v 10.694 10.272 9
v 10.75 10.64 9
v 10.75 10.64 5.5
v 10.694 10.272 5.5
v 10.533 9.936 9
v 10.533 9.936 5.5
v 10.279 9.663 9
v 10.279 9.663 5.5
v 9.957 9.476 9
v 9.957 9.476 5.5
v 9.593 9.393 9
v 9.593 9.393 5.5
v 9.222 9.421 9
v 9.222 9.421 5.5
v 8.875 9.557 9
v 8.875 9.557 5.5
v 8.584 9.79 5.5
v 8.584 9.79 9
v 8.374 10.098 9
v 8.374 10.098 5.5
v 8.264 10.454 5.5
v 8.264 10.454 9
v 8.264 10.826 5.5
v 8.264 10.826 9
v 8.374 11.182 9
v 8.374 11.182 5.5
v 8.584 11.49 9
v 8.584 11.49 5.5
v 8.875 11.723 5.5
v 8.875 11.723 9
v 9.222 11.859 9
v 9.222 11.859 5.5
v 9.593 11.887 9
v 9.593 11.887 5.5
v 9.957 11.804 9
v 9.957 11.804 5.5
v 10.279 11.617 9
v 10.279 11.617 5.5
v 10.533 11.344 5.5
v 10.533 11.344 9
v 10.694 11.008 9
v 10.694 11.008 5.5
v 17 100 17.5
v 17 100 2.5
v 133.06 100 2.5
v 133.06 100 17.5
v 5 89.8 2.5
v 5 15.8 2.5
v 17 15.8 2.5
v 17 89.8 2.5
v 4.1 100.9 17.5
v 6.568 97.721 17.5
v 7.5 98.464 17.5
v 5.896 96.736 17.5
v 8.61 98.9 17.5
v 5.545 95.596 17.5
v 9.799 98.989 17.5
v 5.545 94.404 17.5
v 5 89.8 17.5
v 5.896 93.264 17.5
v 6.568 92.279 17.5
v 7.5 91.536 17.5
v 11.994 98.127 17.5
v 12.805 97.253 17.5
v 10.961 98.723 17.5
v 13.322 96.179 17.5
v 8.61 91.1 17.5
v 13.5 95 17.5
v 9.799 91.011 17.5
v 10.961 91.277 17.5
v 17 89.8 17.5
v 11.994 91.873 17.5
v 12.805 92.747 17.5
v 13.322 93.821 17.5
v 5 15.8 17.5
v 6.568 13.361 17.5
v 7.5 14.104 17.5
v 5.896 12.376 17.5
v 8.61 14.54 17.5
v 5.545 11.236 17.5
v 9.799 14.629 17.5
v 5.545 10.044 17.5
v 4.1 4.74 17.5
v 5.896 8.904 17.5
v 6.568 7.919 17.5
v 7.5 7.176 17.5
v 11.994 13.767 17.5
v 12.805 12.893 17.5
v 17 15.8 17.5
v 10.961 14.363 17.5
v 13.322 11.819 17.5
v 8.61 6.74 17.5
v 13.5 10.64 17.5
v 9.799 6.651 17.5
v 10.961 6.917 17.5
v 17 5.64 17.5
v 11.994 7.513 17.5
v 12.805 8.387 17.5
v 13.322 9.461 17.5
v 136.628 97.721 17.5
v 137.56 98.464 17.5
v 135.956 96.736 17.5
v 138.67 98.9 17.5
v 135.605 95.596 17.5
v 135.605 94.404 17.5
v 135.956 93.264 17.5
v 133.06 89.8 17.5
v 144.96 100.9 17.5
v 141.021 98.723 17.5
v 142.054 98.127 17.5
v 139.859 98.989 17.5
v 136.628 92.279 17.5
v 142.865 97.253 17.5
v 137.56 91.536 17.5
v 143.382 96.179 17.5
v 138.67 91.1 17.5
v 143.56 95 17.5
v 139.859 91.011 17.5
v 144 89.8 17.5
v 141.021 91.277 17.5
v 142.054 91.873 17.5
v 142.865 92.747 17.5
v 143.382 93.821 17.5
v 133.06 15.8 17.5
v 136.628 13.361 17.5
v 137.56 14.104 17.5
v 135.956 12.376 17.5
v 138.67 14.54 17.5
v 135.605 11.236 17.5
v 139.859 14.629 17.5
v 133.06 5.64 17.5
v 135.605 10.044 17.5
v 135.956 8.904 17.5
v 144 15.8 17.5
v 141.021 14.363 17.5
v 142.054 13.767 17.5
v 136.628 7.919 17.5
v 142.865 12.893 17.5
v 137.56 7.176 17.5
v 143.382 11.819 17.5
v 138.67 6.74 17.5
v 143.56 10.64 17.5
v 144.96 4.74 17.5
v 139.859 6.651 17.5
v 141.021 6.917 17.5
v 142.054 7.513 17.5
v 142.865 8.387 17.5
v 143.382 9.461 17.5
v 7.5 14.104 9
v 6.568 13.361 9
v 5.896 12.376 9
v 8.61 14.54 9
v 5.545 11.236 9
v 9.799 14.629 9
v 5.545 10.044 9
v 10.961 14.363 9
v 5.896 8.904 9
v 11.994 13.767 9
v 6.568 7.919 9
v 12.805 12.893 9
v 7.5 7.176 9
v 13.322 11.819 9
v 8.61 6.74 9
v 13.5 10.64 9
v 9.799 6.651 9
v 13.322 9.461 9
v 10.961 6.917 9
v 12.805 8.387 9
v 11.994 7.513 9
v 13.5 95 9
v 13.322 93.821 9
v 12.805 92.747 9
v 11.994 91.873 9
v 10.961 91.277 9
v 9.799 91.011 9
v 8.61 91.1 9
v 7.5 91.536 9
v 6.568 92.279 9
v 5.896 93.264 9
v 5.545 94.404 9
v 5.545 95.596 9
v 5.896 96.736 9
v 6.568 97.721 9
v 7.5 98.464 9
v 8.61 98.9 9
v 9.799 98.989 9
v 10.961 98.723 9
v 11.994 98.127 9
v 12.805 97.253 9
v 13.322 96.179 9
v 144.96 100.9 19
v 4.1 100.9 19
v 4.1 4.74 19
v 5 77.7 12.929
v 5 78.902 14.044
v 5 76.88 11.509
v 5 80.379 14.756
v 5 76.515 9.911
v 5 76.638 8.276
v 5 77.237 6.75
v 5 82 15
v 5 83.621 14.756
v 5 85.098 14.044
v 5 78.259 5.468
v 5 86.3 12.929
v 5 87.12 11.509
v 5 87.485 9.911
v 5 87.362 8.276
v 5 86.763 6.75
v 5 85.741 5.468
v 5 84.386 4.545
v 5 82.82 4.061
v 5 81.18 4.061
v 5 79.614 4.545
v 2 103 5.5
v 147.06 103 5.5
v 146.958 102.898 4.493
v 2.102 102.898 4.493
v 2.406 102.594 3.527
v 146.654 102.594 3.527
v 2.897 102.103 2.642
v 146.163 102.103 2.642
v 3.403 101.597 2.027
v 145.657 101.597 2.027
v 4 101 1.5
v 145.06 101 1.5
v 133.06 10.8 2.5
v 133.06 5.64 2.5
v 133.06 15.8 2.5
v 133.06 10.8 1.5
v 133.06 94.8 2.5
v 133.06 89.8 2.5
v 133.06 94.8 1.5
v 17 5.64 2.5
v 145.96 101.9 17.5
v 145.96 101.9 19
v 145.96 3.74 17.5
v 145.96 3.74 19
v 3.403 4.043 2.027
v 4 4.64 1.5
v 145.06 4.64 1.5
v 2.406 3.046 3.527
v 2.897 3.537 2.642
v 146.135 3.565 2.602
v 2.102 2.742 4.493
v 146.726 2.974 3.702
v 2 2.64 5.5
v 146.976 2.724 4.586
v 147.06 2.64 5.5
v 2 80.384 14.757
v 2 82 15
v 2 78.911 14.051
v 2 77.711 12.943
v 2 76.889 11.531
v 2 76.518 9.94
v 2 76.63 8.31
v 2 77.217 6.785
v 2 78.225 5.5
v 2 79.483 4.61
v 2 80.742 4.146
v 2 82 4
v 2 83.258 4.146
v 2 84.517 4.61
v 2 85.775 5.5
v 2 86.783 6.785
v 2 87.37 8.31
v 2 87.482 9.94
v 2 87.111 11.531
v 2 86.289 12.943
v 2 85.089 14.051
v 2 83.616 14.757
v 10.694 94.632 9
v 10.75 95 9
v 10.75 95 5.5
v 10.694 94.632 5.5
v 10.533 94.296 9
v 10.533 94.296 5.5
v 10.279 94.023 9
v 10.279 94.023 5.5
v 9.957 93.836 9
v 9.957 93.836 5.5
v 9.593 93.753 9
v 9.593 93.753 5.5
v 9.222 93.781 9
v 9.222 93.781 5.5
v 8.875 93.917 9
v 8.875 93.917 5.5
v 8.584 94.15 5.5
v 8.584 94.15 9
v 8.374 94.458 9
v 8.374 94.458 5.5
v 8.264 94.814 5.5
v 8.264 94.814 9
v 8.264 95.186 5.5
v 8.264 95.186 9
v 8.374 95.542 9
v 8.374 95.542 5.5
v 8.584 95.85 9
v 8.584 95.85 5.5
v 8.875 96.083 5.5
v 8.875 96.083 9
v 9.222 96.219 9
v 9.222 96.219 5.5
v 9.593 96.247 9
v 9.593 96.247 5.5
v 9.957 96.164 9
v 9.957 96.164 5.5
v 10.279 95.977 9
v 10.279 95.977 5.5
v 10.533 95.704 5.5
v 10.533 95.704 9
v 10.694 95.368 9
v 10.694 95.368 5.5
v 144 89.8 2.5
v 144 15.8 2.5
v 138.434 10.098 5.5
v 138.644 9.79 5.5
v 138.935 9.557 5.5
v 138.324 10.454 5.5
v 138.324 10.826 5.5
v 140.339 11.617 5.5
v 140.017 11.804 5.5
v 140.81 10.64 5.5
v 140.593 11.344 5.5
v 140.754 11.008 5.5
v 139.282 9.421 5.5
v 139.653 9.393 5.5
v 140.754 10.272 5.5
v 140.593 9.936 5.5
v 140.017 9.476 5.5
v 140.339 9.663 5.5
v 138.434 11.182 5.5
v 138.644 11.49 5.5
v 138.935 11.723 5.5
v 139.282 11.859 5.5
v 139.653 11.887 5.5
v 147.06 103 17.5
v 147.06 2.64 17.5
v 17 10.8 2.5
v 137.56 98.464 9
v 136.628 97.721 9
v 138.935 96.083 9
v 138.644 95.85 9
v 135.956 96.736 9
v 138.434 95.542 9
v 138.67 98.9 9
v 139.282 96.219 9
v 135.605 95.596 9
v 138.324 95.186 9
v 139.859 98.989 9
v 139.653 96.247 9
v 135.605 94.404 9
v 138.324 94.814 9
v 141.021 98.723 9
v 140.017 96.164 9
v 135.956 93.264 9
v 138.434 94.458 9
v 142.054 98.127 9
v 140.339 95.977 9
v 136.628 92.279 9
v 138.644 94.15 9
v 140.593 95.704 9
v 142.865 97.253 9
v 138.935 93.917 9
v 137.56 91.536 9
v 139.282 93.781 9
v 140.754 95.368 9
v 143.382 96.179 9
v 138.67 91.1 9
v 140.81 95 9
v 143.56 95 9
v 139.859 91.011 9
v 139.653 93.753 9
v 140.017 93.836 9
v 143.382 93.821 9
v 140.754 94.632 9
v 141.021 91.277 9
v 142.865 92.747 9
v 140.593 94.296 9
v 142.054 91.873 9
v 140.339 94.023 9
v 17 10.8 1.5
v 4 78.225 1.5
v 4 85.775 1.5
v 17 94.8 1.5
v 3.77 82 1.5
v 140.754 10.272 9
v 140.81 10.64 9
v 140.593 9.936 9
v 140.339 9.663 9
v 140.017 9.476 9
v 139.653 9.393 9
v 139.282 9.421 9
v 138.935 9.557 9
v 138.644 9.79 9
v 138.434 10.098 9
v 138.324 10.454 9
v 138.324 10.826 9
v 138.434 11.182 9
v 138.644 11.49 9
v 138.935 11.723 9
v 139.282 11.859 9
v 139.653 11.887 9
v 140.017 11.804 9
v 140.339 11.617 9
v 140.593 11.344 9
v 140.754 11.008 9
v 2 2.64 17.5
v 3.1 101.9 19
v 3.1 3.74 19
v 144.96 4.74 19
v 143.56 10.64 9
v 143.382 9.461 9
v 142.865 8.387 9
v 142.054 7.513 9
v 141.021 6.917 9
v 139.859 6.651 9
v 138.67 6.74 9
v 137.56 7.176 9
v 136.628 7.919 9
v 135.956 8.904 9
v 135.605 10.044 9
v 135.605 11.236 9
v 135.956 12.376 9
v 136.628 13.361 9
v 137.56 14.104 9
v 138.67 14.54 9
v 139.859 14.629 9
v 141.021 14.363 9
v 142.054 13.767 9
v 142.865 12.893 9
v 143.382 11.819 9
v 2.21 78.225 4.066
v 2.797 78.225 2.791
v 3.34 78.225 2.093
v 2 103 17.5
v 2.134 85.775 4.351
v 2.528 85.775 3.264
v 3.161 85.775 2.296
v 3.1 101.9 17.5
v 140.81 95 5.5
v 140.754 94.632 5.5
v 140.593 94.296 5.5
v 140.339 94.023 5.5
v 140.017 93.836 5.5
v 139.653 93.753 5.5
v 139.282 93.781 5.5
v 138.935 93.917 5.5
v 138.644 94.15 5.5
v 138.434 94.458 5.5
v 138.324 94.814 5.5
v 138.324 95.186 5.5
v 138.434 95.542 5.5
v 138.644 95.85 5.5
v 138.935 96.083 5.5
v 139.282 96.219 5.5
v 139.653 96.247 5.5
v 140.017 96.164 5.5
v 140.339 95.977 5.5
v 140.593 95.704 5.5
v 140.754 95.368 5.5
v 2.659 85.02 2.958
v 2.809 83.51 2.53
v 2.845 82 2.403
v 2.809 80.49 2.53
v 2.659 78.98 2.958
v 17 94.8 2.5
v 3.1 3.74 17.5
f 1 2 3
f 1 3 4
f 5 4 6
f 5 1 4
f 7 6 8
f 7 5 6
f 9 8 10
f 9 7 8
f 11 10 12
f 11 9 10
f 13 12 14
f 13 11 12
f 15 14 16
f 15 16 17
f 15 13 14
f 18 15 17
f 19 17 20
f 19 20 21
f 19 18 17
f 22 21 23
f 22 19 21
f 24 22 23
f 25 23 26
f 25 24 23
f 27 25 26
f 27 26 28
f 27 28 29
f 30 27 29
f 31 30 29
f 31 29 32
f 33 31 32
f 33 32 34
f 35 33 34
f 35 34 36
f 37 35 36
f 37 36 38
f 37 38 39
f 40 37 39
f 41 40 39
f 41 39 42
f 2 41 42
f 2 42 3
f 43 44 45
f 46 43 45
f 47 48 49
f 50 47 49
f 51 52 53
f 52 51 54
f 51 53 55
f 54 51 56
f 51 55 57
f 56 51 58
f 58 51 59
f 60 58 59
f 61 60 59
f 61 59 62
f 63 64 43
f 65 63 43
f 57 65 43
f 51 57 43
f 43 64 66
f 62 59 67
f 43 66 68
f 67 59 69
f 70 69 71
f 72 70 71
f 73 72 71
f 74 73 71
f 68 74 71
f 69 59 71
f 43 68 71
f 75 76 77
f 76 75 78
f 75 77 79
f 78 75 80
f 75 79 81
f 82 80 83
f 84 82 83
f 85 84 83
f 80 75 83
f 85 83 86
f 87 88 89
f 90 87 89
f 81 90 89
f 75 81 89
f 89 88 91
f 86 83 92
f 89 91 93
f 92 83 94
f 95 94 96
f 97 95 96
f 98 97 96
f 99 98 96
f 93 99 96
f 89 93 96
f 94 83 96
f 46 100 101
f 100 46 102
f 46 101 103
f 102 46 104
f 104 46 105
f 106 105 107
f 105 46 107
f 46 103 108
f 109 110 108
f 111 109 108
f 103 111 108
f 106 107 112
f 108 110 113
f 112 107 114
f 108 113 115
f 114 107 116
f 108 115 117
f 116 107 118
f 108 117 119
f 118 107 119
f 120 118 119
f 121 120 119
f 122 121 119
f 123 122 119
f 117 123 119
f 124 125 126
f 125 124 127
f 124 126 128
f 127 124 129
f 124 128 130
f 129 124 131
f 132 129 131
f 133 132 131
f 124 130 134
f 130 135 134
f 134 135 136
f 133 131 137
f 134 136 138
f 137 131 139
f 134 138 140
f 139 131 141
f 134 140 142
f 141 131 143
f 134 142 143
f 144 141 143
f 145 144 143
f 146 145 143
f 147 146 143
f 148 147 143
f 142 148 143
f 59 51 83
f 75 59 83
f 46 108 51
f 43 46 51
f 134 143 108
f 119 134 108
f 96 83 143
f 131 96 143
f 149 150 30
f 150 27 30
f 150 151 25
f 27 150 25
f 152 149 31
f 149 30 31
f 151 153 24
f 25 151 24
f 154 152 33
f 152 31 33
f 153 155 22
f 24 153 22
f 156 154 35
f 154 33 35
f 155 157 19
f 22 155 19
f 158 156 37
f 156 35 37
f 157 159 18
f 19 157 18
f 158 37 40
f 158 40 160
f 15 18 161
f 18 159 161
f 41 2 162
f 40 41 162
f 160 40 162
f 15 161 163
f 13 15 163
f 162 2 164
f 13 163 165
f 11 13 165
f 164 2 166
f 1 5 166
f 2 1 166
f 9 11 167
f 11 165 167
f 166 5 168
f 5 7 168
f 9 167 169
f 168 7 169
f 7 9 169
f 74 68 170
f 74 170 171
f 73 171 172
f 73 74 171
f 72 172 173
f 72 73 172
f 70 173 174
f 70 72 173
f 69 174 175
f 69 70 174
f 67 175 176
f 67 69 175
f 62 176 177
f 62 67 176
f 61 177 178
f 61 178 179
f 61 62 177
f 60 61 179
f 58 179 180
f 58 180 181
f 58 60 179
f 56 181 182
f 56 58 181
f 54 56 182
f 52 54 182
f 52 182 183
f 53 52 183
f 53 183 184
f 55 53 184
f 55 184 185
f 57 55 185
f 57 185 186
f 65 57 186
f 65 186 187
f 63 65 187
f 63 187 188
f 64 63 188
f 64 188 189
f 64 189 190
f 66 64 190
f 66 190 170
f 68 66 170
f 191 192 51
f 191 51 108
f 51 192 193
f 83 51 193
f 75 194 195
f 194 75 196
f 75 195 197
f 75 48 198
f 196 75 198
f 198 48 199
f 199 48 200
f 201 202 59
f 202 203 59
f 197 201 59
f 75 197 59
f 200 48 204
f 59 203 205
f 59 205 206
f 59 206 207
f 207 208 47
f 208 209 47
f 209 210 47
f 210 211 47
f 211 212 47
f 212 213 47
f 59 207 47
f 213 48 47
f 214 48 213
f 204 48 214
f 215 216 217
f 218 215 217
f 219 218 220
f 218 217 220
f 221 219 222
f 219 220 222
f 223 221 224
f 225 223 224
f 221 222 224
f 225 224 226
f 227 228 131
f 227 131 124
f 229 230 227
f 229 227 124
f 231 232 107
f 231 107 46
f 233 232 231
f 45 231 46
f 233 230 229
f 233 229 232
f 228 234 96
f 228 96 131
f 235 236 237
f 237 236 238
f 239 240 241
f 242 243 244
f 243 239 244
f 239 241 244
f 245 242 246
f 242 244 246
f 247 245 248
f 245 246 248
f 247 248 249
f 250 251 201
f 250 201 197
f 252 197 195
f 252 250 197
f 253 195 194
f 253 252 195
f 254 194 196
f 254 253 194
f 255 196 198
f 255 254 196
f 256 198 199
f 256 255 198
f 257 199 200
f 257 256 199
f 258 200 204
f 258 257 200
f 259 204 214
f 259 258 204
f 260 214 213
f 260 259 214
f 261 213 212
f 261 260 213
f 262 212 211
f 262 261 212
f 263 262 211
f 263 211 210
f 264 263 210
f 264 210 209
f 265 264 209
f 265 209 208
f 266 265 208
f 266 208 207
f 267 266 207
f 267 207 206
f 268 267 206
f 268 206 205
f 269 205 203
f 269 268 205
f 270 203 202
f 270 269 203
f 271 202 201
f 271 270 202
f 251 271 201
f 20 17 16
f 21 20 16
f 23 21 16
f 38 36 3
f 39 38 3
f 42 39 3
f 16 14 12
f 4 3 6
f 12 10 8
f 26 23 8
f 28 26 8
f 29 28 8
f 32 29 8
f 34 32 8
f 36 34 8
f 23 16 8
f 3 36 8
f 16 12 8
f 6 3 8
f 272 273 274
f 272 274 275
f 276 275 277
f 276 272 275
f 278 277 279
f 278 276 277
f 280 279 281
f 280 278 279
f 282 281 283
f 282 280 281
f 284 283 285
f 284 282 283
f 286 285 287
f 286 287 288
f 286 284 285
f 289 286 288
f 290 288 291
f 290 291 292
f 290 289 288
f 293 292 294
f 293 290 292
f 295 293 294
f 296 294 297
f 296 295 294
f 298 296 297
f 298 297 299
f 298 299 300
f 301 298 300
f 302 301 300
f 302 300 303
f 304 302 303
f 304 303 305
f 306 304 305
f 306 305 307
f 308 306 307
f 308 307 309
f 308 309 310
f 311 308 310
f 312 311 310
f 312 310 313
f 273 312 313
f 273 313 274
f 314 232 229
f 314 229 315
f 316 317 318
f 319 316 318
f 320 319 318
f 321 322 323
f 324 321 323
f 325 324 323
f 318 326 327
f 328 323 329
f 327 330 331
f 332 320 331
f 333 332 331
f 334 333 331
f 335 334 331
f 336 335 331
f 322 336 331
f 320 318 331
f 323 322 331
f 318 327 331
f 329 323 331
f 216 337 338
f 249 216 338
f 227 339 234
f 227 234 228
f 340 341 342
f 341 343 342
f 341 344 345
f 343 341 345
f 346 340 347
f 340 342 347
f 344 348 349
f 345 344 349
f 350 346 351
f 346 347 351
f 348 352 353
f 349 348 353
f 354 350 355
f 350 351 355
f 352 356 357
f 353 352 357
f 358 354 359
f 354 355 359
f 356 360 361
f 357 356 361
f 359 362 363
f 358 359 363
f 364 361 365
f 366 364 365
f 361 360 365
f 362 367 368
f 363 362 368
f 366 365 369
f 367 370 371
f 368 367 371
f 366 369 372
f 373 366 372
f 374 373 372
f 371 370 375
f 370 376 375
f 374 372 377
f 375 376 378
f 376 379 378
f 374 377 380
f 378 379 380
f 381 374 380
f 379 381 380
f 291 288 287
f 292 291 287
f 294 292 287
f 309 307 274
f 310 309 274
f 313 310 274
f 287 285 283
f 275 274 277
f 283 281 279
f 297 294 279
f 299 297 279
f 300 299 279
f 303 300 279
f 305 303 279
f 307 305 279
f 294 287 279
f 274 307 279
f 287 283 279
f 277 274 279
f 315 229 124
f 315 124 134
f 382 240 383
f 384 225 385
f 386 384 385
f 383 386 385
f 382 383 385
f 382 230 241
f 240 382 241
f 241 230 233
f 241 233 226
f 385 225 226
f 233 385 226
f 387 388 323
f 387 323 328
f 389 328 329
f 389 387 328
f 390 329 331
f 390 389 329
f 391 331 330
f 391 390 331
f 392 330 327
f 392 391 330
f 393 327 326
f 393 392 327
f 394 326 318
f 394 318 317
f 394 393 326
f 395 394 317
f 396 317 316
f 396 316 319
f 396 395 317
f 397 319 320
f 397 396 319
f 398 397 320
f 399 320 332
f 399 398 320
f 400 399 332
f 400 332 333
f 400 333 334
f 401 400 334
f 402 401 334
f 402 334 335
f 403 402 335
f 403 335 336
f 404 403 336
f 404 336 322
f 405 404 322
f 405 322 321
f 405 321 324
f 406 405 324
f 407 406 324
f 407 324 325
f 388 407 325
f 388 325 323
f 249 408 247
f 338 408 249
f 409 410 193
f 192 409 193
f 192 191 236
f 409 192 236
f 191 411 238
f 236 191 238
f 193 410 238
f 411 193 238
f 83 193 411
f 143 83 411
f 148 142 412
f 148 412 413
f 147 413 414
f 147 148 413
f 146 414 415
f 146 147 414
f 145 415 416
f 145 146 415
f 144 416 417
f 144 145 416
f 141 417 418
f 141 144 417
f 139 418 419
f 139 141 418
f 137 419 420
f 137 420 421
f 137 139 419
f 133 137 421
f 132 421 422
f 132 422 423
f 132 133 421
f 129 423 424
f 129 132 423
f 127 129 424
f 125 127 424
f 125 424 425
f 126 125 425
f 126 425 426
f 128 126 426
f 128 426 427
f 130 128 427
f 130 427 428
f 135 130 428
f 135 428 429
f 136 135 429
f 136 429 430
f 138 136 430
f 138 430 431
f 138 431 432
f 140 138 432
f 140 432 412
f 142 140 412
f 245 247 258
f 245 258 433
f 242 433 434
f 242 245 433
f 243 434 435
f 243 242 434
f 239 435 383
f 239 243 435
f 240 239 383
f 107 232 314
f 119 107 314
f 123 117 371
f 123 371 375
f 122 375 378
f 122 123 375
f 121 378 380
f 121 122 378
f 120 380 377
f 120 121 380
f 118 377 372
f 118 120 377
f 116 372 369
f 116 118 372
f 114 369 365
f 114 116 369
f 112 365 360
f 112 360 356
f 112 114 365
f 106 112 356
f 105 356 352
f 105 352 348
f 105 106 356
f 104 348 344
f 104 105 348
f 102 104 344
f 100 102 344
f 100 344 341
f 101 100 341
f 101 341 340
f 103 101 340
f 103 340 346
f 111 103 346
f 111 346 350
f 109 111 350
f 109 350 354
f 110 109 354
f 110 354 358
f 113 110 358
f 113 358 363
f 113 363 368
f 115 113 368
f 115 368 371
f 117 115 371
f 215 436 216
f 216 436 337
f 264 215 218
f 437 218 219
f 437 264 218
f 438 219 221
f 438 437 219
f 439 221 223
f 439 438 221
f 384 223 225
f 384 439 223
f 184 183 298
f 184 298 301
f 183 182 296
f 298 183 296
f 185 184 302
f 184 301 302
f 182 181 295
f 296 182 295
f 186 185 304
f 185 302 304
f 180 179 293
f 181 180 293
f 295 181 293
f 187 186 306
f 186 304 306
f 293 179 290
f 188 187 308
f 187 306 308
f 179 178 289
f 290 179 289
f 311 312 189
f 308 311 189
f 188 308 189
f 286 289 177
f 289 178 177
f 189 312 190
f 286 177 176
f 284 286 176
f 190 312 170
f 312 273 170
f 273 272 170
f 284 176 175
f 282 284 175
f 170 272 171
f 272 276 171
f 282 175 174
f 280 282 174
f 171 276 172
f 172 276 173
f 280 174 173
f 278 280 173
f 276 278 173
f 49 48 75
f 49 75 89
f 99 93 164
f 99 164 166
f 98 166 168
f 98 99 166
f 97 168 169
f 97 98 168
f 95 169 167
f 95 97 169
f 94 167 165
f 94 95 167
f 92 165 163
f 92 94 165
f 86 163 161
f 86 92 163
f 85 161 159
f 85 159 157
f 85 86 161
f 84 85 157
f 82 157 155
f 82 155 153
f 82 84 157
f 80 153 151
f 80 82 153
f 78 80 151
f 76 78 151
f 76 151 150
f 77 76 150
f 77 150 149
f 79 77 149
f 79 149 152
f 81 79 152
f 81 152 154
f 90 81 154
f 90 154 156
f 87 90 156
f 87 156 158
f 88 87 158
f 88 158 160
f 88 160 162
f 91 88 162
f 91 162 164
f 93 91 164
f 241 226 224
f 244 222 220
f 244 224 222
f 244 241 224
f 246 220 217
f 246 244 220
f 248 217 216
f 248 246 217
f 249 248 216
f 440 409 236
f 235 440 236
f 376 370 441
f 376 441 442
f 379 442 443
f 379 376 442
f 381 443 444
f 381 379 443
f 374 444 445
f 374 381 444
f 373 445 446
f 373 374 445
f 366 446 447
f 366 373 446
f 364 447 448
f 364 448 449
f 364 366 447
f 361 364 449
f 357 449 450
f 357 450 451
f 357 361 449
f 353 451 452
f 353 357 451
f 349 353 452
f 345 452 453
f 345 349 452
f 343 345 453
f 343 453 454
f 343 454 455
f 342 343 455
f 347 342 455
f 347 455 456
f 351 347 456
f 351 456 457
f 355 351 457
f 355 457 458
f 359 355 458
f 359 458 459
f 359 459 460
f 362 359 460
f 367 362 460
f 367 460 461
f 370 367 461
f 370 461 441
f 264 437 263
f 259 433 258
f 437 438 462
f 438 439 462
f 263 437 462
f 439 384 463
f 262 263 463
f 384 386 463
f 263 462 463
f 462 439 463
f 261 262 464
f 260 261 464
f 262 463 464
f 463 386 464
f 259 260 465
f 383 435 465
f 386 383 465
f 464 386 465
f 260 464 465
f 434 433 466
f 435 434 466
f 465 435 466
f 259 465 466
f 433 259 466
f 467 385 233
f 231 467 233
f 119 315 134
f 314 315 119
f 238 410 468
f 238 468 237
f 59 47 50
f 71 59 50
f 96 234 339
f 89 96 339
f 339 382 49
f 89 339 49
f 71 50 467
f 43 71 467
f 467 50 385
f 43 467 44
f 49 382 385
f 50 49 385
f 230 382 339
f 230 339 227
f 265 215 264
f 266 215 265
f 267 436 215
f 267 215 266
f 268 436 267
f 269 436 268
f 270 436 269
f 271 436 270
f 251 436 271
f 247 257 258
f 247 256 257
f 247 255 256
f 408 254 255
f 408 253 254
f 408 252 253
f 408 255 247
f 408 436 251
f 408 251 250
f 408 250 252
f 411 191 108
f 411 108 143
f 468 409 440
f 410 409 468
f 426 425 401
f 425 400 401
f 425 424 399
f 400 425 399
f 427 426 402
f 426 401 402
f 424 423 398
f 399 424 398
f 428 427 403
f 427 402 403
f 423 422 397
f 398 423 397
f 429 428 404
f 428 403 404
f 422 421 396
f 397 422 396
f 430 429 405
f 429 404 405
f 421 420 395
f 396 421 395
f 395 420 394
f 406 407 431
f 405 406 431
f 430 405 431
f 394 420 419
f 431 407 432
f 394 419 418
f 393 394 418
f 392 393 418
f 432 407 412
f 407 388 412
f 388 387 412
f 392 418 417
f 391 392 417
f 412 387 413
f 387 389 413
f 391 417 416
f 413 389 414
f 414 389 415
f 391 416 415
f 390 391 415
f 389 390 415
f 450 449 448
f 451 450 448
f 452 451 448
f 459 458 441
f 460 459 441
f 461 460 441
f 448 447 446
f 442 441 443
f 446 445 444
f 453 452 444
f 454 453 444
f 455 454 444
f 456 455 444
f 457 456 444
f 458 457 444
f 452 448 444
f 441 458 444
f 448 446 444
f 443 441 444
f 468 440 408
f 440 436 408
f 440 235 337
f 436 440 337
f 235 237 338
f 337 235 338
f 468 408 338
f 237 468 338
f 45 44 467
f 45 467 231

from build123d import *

# Parameters (mm, degrees)
BOX025_W                  = 116.06
BOX025_H                  = 84
BOX025_DEPTH              = 1
BOX026_W                  = 139
BOX026_H                  = 74
BOX026_DEPTH              = 1
BOX024_W                  = 139
BOX024_H                  = 74
BOX024_DEPTH              = 1
BOX023_W                  = 116.06
BOX023_H                  = 94.36
BOX023_DEPTH              = 1
BOX022_W                  = 139
BOX022_H                  = 74
BOX022_DEPTH              = 20
BOX021_W                  = 147
BOX021_H                  = 105
BOX021_DEPTH              = 10
BOX_W                     = 116.06
BOX_H                     = 94.36
BOX_DEPTH                 = 10
BOX019_W                  = 40
BOX019_H                  = 2
BOX019_DEPTH              = 1
ARRAY_Y_COUNT             = 2
ARRAY_Y_PITCH             = 60
BOX020_W                  = 2
BOX020_H                  = 60
BOX020_DEPTH              = 1
ARRAY028_X_COUNT          = 2
ARRAY028_X_PITCH          = 40
BOX018_W                  = 40
BOX018_H                  = 60
BOX018_DEPTH              = 5
CYLINDER023_R             = 4
CYLINDER023_DEPTH         = 25
ARRAY027_X_COUNT          = 2
ARRAY027_X_PITCH          = 130.06
ARRAY027_Y_COUNT          = 2
ARRAY027_Y_PITCH          = 84.36
BOX017_W                  = 100
BOX017_H                  = 94.36
BOX017_DEPTH              = 27.5
CYLINDER010_R             = 1
CYLINDER010_DEPTH         = 10
ARRAY008_COUNT            = 8
CYLINDER009_R             = 1
CYLINDER009_DEPTH         = 10
CYLINDER008_R             = 11
CYLINDER008_DEPTH         = 1
BOX012_W                  = 40
BOX012_H                  = 60
BOX012_DEPTH              = 1
CYLINDER007_R             = 2.75
CYLINDER007_DEPTH         = 4
CYLINDER006_R             = 2.75
CYLINDER006_DEPTH         = 4
CYLINDER005_R             = 3
CYLINDER005_DEPTH         = 1
CYLINDER004_R             = 3
CYLINDER004_DEPTH         = 1
BOX011_W                  = 1
BOX011_H                  = 98.16
BOX011_DEPTH              = 1.5
ARRAY007_X_COUNT          = 2
ARRAY007_X_PITCH          = 141.86
CYLINDER003_R             = 5.5
CYLINDER003_DEPTH         = 19
CYLINDER003_PITCH_ANGLE   = 90
BOX007_W                  = 7
BOX007_H                  = 7
BOX007_DEPTH              = 19.5
ARRAY003_X_COUNT          = 2
ARRAY003_X_PITCH          = 77.06
ARRAY003_Y_COUNT          = 2
ARRAY003_Y_PITCH          = 87.36
CYLINDER002_R             = 1.25
CYLINDER002_DEPTH         = 43
ARRAY002_X_COUNT          = 2
ARRAY002_X_PITCH          = 130.06
ARRAY002_Y_COUNT          = 2
ARRAY002_Y_PITCH          = 84.36
BOX006_W                  = 116.06
BOX006_H                  = 94.36
BOX006_DEPTH              = 14
BOX005_W                  = 145.06
BOX005_H                  = 100.36
BOX005_DEPTH              = 17
BOX010_W                  = 142.76
BOX010_H                  = 1
BOX010_DEPTH              = 1.5
ARRAY006_Y_COUNT          = 2
ARRAY006_Y_PITCH          = 97.16
FILLET_R                  = 5
FUSION010_PLACEMENT_ANGLE = 180


with BuildPart() as big_rect002:
    # Box025 → Box025 (new body)
    with BuildSketch(Plane(origin=(17, 10.8, 1.5), x_dir=(1, 0, 0), z_dir=(0, 0, 1))):
        with Locations((58.03, 42)):
            Rectangle(BOX025_W, BOX025_H)
    extrude(amount=BOX025_DEPTH)


with BuildPart() as big_rect003:
    # Box026 → Box026 (new body)
    with BuildSketch(Plane(origin=(5, 15.8, 1.5), x_dir=(1, 0, 0), z_dir=(0, 0, 1))):
        with Locations((69.5, 37)):
            Rectangle(BOX026_W, BOX026_H)
    extrude(amount=BOX026_DEPTH)


with BuildPart() as big_rect001:
    # Box024 → Box024 (new body)
    with BuildSketch(Plane(origin=(5, 15.8, 1.5), x_dir=(1, 0, 0), z_dir=(0, 0, 1))):
        with Locations((69.5, 37)):
            Rectangle(BOX024_W, BOX024_H)
    extrude(amount=BOX024_DEPTH)


with BuildPart() as big_rect:
    # Box023 → Box023 (new body)
    with BuildSketch(Plane(origin=(17, 5.64, 1.5), x_dir=(1, 0, 0), z_dir=(0, 0, 1))):
        with Locations((58.03, 47.18)):
            Rectangle(BOX023_W, BOX023_H)
    extrude(amount=BOX023_DEPTH)


with BuildPart() as cube002:
    # Box022 → Box022 (new body)
    with BuildSketch(Plane(origin=(5, 15.8, 0.5), x_dir=(1, 0, 0), z_dir=(0, 0, 1))):
        with Locations((69.5, 37)):
            Rectangle(BOX022_W, BOX022_H)
    extrude(amount=BOX022_DEPTH)


with BuildPart() as cube001:
    # Box021 → Box021 (new body)
    with BuildSketch(Plane(origin=(2, 0, -8.5), x_dir=(1, 0, 0), z_dir=(0, 0, 1))):
        with Locations((73.5, 52.5)):
            Rectangle(BOX021_W, BOX021_H)
    extrude(amount=BOX021_DEPTH)


with BuildPart() as cube:
    # Box → Box (new body)
    with BuildSketch(Plane(origin=(17, 5.64, 1.5), x_dir=(1, 0, 0), z_dir=(0, 0, 1))):
        with Locations((58.03, 47.18)):
            Rectangle(BOX_W, BOX_H)
    extrude(amount=BOX_DEPTH)


with BuildPart() as array_border_rfid_short:
    # Box019 → Box019 (new body)
    with BuildSketch(Plane(origin=(85, 23, 32.5), x_dir=(1, 0, 0), z_dir=(0, 0, 1))):
        with Locations((20, 1)):
            Rectangle(BOX019_W, BOX019_H)
    extrude(amount=BOX019_DEPTH)

    # Array Y: array_border_rfid_short ×2


with BuildPart() as array_border_rfid_short_1:
    add(array_border_rfid_short.part)
    with Locations(*[(0, i * ARRAY_Y_PITCH, 0) for i in range(1, ARRAY_Y_COUNT)]):
        add(array_border_rfid_short.part)


with BuildPart() as border_rfid_slot:
    # Box020 → Box020 (new body)
    with BuildSketch(Plane(origin=(84, 24, 32.5), x_dir=(1, 0, 0), z_dir=(0, 0, 1))):
        with Locations((1, 30)):
            Rectangle(BOX020_W, BOX020_H)
    extrude(amount=BOX020_DEPTH)

    # Array028 X: border_rfid_slot ×2


with BuildPart() as border_rfid_slot_1:
    add(border_rfid_slot.part)
    with Locations(*[(i * ARRAY028_X_PITCH, 0, 0) for i in range(1, ARRAY028_X_COUNT)]):
        add(border_rfid_slot.part)

    # Fusion: union array_border_rfid_short
    add(array_border_rfid_short_1.part)


with BuildPart() as slot_for_rfid_hole:
    # Box018 → Box018 (new body)
    with BuildSketch(Plane(origin=(85, 24, 29.5), x_dir=(1, 0, 0), z_dir=(0, 0, 1))):
        with Locations((20, 30)):
            Rectangle(BOX018_W, BOX018_H)
    extrude(amount=BOX018_DEPTH)


with BuildPart() as array027:
    # Cylinder023 → Cylinder023 (new body)
    with BuildSketch(Plane(origin=(3.5, 8, 0), x_dir=(1, 0, 0), z_dir=(0, 0, 1))):
        Circle(CYLINDER023_R)
    extrude(amount=CYLINDER023_DEPTH)

    # Array027 X: Array027 ×2


with BuildPart() as array027_1:
    add(array027.part)
    with Locations(*[(i * ARRAY027_X_PITCH, 0, 0) for i in range(1, ARRAY027_X_COUNT)]):
        add(array027.part)

    # Array027 Y: Array027 ×2


with BuildPart() as array027_2:
    add(array027_1.part)
    with Locations(*[(0, i * ARRAY027_Y_PITCH, 0) for i in range(1, ARRAY027_Y_COUNT)]):
        add(array027_1.part)


with BuildPart() as erase_supports_top:
    # Box017 → Box017 (new body)
    with BuildSketch(Plane(origin=(11, 3, 3), x_dir=(1, 0, 0), z_dir=(0, 0, 1))):
        with Locations((50, 47.18)):
            Rectangle(BOX017_W, BOX017_H)
    extrude(amount=BOX017_DEPTH)


with BuildPart() as miniholes_buzzer_polar:
    # Cylinder010 → Cylinder010 (new body)
    with BuildSketch(Plane(origin=(18.45, 78.5, 49.5), x_dir=(1, 0, 0), z_dir=(0, 0, 1))):
        Circle(CYLINDER010_R)
    extrude(amount=CYLINDER010_DEPTH)

    # Array008: miniholes_buzzer_polar ×8 about axis
    array008_axis = Axis((25.45, 78.5, 49.5), (0, 0, 1))


with BuildPart() as miniholes_buzzer_polar_1:
    add(miniholes_buzzer_polar.part)
    for i in range(1, ARRAY008_COUNT):
        add(miniholes_buzzer_polar.part.rotate(array008_axis, i * 360 / ARRAY008_COUNT))


with BuildPart() as miniholes_buzzer_center:
    # Cylinder009 → Cylinder009 (new body)
    with BuildSketch(Plane(origin=(25.446, 78.5, 49.5), x_dir=(1, 0, 0), z_dir=(0, 0, 1))):
        Circle(CYLINDER009_R)
    extrude(amount=CYLINDER009_DEPTH)


with BuildPart() as slot_for_buzzer:
    # Cylinder008 → Cylinder008 (new body)
    with BuildSketch(Plane(origin=(39.4, 79.4, 54.5), x_dir=(1, 0, 0), z_dir=(0, 0, 1))):
        Circle(CYLINDER008_R)
    extrude(amount=CYLINDER008_DEPTH)


with BuildPart() as slot_for_rfid:
    # Box012 → Box012 (new body)
    with BuildSketch(Plane(origin=(85, 24, 54.5), x_dir=(1, 0, 0), z_dir=(0, 0, 1))):
        with Locations((20, 30)):
            Rectangle(BOX012_W, BOX012_H)
    extrude(amount=BOX012_DEPTH)


with BuildPart() as led2_hole_up001:
    # Cylinder007 → Cylinder007 (new body)
    with BuildSketch(Plane(origin=(71.9, 84.5, 51.5), x_dir=(1, 0, 0), z_dir=(0, 0, 1))):
        Circle(CYLINDER007_R)
    extrude(amount=CYLINDER007_DEPTH)


with BuildPart() as led1_hole_up001:
    # Cylinder006 → Cylinder006 (new body)
    with BuildSketch(Plane(origin=(71.9, 74.3, 51.5), x_dir=(1, 0, 0), z_dir=(0, 0, 1))):
        Circle(CYLINDER006_R)
    extrude(amount=CYLINDER006_DEPTH)


with BuildPart() as led1_hole_up:
    # Cylinder005 → Cylinder005 (new body)
    with BuildSketch(Plane(origin=(71.9, 74.3, 52.5), x_dir=(1, 0, 0), z_dir=(0, 0, 1))):
        Circle(CYLINDER005_R)
    extrude(amount=CYLINDER005_DEPTH)


with BuildPart() as led2_hole_up:
    # Cylinder004 → Cylinder004 (new body)
    with BuildSketch(Plane(origin=(71.9, 84.5, 52.5), x_dir=(1, 0, 0), z_dir=(0, 0, 1))):
        Circle(CYLINDER004_R)
    extrude(amount=CYLINDER004_DEPTH)


with BuildPart() as array_cierre_top_width:
    # Box011 → Box011 (new body)
    with BuildSketch(Plane(origin=(-2.9, 1.1, 34.5), x_dir=(1, 0, 0), z_dir=(0, 0, 1))):
        with Locations((0.5, 49.08)):
            Rectangle(BOX011_W, BOX011_H)
    extrude(amount=BOX011_DEPTH)

    # Array007 X: array_cierre_top_width ×2


with BuildPart() as array_cierre_top_width_1:
    add(array_cierre_top_width.part)
    with Locations(*[(i * ARRAY007_X_PITCH, 0, 0) for i in range(1, ARRAY007_X_COUNT)]):
        add(array_cierre_top_width.part)


with BuildPart() as hole_power_supply:
    # Cylinder003 → Cylinder003 (new body)
    with BuildSketch(Plane.XY):
        Circle(CYLINDER003_R)
    extrude(amount=CYLINDER003_DEPTH)


with BuildPart() as hole_power_supply_1:
    # Cylinder003 pitch: moved
    add(hole_power_supply.part.rotate(Axis((0, 0, 0), (0, 1, 0)), CYLINDER003_PITCH_ANGLE))


with BuildPart() as hole_power_supply_2:
    # Cylinder003 placement: moved
    add(hole_power_supply_1.part.moved(Location((-5, 21, 23))))


with BuildPart() as array_top_case_support_master:
    # Box007 → Box007 (new body)
    with BuildSketch(Plane(origin=(18.5, 3, -10.5), x_dir=(1, 0, 0), z_dir=(0, 0, 1))):
        with Locations((3.5, 3.5)):
            Rectangle(BOX007_W, BOX007_H)
    extrude(amount=BOX007_DEPTH)

    # Array003 X: array_top_case_support_master ×2


with BuildPart() as array_top_case_support_master_1:
    add(array_top_case_support_master.part)
    with Locations(*[(i * ARRAY003_X_PITCH, 0, 0) for i in range(1, ARRAY003_X_COUNT)]):
        add(array_top_case_support_master.part)

    # Array003 Y: array_top_case_support_master ×2


with BuildPart() as array_top_case_support_master_2:
    add(array_top_case_support_master_1.part)
    with Locations(*[(0, i * ARRAY003_Y_PITCH, 0) for i in range(1, ARRAY003_Y_COUNT)]):
        add(array_top_case_support_master_1.part)


with BuildPart() as array_top_case_support_master_3:
    # Array003 placement: moved
    add(array_top_case_support_master_2.part.moved(Location((0, 0, 36))))


with BuildPart() as array002:
    # Cylinder002 → Cylinder002 (new body)
    with BuildSketch(Plane(origin=(3.5, 8, 0), x_dir=(1, 0, 0), z_dir=(0, 0, 1))):
        Circle(CYLINDER002_R)
    extrude(amount=CYLINDER002_DEPTH)

    # Array002 X: Array002 ×2


with BuildPart() as array002_1:
    add(array002.part)
    with Locations(*[(i * ARRAY002_X_PITCH, 0, 0) for i in range(1, ARRAY002_X_COUNT)]):
        add(array002.part)

    # Array002 Y: Array002 ×2


with BuildPart() as array002_2:
    add(array002_1.part)
    with Locations(*[(0, i * ARRAY002_Y_PITCH, 0) for i in range(1, ARRAY002_Y_COUNT)]):
        add(array002_1.part)


with BuildPart() as top_case_master_emptying:
    # Box006 → Box006 (new body)
    with BuildSketch(Plane(origin=(11, 3, 31), x_dir=(1, 0, 0), z_dir=(0, 0, 1))):
        with Locations((58.03, 47.18)):
            Rectangle(BOX006_W, BOX006_H)
    extrude(amount=BOX006_DEPTH)


with BuildPart() as fusion007:
    # Box005 → Box005 (new body)
    with BuildSketch(Plane(origin=(-4, 0, 31), x_dir=(1, 0, 0), z_dir=(0, 0, 1))):
        with Locations((72.53, 50.18)):
            Rectangle(BOX005_W, BOX005_H)
    extrude(amount=BOX005_DEPTH)

    # Cut002: cut top_case_master_emptying
    add(top_case_master_emptying.part, mode=Mode.SUBTRACT)

    # Cut003: cut Array002
    add(array002_2.part, mode=Mode.SUBTRACT)

    # Fusion004: union array_top_case_support_master
    add(array_top_case_support_master_3.part)


with BuildPart() as fusion007_1:
    # Fusion004 placement: moved
    add(fusion007.part.moved(Location((0, 0, -16))))

    # Cut004: cut hole_power_supply
    add(hole_power_supply_2.part, mode=Mode.SUBTRACT)


with BuildPart() as fusion007_2:
    # Cut004 placement: moved
    add(fusion007_1.part.moved(Location((0, 0, 21))))

    # Fusion007: union array_cierre_top_width
    add(array_cierre_top_width_1.part)


with BuildPart() as cut029:
    # Box010 → Box010 (new body)
    with BuildSketch(Plane(origin=(-2.9, 1.1, 34.5), x_dir=(1, 0, 0), z_dir=(0, 0, 1))):
        with Locations((71.38, 0.5)):
            Rectangle(BOX010_W, BOX010_H)
    extrude(amount=BOX010_DEPTH)

    # Array006 Y: Cut029 ×2


with BuildPart() as cut029_1:
    add(cut029.part)
    with Locations(*[(0, i * ARRAY006_Y_PITCH, 0) for i in range(1, ARRAY006_Y_COUNT)]):
        add(cut029.part)

    # Fusion008: union Fusion007
    add(fusion007_2.part)


with BuildPart() as cut029_2:
    # Fusion008 placement: moved
    add(cut029_1.part.moved(Location((0, 0, 2.5))))

    # Cut005: cut led2_hole_up
    add(led2_hole_up.part, mode=Mode.SUBTRACT)

    # Cut006: cut led1_hole_up
    add(led1_hole_up.part, mode=Mode.SUBTRACT)

    # Cut007: cut led1_hole_up001
    add(led1_hole_up001.part, mode=Mode.SUBTRACT)

    # Cut008: cut led2_hole_up001
    add(led2_hole_up001.part, mode=Mode.SUBTRACT)

    # Fillet
    fillet_edges = [cut029_2.edges().sort_by_distance(p)[0] for p in [
        (-4, 50.18, 55.5),
        (68.53, 0, 55.5),
        (68.53, 100.36, 55.5),
        (141.06, 50.18, 55.5),
    ]]
    fillet(fillet_edges, radius=FILLET_R)

    # Cut009: cut slot_for_rfid
    add(slot_for_rfid.part, mode=Mode.SUBTRACT)

    # Fusion009: union slot_for_buzzer
    add(slot_for_buzzer.part)

    # Cut010: cut miniholes_buzzer_center
    add(miniholes_buzzer_center.part, mode=Mode.SUBTRACT)

    # Cut011: cut miniholes_buzzer_polar
    add(miniholes_buzzer_polar_1.part, mode=Mode.SUBTRACT)


with BuildPart() as cut029_3:
    # Cut011 placement: moved
    add(cut029_2.part.moved(Location((0, 0, -22))))

    # Cut015: cut erase_supports_top
    add(erase_supports_top.part, mode=Mode.SUBTRACT)

    # Cut024: cut Array027
    add(array027_2.part, mode=Mode.SUBTRACT)

    # Cut: cut slot_for_rfid_hole
    add(slot_for_rfid_hole.part, mode=Mode.SUBTRACT)

    # Fusion010: union border_rfid_slot
    add(border_rfid_slot_1.part)


with BuildPart() as cut029_4:
    # Fusion010 placement: moved
    add(cut029_3.part.moved(Location((6, 103, 34))).rotate(Axis((6, 103, 34), (1, 0, 0)), FUSION010_PLACEMENT_ANGLE))

    # Cut025: cut Cube
    add(cube.part, mode=Mode.SUBTRACT)

    # Cut026: cut Cube001
    add(cube001.part, mode=Mode.SUBTRACT)

    # Cut027: cut Cube002
    add(cube002.part, mode=Mode.SUBTRACT)

    # Fusion011: union big_rect
    add(big_rect.part)

    # Cut028: cut big_rect001
    add(big_rect001.part, mode=Mode.SUBTRACT)

    # Fusion012: union big_rect003
    add(big_rect003.part)

    # Cut029: cut big_rect002
    add(big_rect002.part, mode=Mode.SUBTRACT)


solid = cut029_4.part
